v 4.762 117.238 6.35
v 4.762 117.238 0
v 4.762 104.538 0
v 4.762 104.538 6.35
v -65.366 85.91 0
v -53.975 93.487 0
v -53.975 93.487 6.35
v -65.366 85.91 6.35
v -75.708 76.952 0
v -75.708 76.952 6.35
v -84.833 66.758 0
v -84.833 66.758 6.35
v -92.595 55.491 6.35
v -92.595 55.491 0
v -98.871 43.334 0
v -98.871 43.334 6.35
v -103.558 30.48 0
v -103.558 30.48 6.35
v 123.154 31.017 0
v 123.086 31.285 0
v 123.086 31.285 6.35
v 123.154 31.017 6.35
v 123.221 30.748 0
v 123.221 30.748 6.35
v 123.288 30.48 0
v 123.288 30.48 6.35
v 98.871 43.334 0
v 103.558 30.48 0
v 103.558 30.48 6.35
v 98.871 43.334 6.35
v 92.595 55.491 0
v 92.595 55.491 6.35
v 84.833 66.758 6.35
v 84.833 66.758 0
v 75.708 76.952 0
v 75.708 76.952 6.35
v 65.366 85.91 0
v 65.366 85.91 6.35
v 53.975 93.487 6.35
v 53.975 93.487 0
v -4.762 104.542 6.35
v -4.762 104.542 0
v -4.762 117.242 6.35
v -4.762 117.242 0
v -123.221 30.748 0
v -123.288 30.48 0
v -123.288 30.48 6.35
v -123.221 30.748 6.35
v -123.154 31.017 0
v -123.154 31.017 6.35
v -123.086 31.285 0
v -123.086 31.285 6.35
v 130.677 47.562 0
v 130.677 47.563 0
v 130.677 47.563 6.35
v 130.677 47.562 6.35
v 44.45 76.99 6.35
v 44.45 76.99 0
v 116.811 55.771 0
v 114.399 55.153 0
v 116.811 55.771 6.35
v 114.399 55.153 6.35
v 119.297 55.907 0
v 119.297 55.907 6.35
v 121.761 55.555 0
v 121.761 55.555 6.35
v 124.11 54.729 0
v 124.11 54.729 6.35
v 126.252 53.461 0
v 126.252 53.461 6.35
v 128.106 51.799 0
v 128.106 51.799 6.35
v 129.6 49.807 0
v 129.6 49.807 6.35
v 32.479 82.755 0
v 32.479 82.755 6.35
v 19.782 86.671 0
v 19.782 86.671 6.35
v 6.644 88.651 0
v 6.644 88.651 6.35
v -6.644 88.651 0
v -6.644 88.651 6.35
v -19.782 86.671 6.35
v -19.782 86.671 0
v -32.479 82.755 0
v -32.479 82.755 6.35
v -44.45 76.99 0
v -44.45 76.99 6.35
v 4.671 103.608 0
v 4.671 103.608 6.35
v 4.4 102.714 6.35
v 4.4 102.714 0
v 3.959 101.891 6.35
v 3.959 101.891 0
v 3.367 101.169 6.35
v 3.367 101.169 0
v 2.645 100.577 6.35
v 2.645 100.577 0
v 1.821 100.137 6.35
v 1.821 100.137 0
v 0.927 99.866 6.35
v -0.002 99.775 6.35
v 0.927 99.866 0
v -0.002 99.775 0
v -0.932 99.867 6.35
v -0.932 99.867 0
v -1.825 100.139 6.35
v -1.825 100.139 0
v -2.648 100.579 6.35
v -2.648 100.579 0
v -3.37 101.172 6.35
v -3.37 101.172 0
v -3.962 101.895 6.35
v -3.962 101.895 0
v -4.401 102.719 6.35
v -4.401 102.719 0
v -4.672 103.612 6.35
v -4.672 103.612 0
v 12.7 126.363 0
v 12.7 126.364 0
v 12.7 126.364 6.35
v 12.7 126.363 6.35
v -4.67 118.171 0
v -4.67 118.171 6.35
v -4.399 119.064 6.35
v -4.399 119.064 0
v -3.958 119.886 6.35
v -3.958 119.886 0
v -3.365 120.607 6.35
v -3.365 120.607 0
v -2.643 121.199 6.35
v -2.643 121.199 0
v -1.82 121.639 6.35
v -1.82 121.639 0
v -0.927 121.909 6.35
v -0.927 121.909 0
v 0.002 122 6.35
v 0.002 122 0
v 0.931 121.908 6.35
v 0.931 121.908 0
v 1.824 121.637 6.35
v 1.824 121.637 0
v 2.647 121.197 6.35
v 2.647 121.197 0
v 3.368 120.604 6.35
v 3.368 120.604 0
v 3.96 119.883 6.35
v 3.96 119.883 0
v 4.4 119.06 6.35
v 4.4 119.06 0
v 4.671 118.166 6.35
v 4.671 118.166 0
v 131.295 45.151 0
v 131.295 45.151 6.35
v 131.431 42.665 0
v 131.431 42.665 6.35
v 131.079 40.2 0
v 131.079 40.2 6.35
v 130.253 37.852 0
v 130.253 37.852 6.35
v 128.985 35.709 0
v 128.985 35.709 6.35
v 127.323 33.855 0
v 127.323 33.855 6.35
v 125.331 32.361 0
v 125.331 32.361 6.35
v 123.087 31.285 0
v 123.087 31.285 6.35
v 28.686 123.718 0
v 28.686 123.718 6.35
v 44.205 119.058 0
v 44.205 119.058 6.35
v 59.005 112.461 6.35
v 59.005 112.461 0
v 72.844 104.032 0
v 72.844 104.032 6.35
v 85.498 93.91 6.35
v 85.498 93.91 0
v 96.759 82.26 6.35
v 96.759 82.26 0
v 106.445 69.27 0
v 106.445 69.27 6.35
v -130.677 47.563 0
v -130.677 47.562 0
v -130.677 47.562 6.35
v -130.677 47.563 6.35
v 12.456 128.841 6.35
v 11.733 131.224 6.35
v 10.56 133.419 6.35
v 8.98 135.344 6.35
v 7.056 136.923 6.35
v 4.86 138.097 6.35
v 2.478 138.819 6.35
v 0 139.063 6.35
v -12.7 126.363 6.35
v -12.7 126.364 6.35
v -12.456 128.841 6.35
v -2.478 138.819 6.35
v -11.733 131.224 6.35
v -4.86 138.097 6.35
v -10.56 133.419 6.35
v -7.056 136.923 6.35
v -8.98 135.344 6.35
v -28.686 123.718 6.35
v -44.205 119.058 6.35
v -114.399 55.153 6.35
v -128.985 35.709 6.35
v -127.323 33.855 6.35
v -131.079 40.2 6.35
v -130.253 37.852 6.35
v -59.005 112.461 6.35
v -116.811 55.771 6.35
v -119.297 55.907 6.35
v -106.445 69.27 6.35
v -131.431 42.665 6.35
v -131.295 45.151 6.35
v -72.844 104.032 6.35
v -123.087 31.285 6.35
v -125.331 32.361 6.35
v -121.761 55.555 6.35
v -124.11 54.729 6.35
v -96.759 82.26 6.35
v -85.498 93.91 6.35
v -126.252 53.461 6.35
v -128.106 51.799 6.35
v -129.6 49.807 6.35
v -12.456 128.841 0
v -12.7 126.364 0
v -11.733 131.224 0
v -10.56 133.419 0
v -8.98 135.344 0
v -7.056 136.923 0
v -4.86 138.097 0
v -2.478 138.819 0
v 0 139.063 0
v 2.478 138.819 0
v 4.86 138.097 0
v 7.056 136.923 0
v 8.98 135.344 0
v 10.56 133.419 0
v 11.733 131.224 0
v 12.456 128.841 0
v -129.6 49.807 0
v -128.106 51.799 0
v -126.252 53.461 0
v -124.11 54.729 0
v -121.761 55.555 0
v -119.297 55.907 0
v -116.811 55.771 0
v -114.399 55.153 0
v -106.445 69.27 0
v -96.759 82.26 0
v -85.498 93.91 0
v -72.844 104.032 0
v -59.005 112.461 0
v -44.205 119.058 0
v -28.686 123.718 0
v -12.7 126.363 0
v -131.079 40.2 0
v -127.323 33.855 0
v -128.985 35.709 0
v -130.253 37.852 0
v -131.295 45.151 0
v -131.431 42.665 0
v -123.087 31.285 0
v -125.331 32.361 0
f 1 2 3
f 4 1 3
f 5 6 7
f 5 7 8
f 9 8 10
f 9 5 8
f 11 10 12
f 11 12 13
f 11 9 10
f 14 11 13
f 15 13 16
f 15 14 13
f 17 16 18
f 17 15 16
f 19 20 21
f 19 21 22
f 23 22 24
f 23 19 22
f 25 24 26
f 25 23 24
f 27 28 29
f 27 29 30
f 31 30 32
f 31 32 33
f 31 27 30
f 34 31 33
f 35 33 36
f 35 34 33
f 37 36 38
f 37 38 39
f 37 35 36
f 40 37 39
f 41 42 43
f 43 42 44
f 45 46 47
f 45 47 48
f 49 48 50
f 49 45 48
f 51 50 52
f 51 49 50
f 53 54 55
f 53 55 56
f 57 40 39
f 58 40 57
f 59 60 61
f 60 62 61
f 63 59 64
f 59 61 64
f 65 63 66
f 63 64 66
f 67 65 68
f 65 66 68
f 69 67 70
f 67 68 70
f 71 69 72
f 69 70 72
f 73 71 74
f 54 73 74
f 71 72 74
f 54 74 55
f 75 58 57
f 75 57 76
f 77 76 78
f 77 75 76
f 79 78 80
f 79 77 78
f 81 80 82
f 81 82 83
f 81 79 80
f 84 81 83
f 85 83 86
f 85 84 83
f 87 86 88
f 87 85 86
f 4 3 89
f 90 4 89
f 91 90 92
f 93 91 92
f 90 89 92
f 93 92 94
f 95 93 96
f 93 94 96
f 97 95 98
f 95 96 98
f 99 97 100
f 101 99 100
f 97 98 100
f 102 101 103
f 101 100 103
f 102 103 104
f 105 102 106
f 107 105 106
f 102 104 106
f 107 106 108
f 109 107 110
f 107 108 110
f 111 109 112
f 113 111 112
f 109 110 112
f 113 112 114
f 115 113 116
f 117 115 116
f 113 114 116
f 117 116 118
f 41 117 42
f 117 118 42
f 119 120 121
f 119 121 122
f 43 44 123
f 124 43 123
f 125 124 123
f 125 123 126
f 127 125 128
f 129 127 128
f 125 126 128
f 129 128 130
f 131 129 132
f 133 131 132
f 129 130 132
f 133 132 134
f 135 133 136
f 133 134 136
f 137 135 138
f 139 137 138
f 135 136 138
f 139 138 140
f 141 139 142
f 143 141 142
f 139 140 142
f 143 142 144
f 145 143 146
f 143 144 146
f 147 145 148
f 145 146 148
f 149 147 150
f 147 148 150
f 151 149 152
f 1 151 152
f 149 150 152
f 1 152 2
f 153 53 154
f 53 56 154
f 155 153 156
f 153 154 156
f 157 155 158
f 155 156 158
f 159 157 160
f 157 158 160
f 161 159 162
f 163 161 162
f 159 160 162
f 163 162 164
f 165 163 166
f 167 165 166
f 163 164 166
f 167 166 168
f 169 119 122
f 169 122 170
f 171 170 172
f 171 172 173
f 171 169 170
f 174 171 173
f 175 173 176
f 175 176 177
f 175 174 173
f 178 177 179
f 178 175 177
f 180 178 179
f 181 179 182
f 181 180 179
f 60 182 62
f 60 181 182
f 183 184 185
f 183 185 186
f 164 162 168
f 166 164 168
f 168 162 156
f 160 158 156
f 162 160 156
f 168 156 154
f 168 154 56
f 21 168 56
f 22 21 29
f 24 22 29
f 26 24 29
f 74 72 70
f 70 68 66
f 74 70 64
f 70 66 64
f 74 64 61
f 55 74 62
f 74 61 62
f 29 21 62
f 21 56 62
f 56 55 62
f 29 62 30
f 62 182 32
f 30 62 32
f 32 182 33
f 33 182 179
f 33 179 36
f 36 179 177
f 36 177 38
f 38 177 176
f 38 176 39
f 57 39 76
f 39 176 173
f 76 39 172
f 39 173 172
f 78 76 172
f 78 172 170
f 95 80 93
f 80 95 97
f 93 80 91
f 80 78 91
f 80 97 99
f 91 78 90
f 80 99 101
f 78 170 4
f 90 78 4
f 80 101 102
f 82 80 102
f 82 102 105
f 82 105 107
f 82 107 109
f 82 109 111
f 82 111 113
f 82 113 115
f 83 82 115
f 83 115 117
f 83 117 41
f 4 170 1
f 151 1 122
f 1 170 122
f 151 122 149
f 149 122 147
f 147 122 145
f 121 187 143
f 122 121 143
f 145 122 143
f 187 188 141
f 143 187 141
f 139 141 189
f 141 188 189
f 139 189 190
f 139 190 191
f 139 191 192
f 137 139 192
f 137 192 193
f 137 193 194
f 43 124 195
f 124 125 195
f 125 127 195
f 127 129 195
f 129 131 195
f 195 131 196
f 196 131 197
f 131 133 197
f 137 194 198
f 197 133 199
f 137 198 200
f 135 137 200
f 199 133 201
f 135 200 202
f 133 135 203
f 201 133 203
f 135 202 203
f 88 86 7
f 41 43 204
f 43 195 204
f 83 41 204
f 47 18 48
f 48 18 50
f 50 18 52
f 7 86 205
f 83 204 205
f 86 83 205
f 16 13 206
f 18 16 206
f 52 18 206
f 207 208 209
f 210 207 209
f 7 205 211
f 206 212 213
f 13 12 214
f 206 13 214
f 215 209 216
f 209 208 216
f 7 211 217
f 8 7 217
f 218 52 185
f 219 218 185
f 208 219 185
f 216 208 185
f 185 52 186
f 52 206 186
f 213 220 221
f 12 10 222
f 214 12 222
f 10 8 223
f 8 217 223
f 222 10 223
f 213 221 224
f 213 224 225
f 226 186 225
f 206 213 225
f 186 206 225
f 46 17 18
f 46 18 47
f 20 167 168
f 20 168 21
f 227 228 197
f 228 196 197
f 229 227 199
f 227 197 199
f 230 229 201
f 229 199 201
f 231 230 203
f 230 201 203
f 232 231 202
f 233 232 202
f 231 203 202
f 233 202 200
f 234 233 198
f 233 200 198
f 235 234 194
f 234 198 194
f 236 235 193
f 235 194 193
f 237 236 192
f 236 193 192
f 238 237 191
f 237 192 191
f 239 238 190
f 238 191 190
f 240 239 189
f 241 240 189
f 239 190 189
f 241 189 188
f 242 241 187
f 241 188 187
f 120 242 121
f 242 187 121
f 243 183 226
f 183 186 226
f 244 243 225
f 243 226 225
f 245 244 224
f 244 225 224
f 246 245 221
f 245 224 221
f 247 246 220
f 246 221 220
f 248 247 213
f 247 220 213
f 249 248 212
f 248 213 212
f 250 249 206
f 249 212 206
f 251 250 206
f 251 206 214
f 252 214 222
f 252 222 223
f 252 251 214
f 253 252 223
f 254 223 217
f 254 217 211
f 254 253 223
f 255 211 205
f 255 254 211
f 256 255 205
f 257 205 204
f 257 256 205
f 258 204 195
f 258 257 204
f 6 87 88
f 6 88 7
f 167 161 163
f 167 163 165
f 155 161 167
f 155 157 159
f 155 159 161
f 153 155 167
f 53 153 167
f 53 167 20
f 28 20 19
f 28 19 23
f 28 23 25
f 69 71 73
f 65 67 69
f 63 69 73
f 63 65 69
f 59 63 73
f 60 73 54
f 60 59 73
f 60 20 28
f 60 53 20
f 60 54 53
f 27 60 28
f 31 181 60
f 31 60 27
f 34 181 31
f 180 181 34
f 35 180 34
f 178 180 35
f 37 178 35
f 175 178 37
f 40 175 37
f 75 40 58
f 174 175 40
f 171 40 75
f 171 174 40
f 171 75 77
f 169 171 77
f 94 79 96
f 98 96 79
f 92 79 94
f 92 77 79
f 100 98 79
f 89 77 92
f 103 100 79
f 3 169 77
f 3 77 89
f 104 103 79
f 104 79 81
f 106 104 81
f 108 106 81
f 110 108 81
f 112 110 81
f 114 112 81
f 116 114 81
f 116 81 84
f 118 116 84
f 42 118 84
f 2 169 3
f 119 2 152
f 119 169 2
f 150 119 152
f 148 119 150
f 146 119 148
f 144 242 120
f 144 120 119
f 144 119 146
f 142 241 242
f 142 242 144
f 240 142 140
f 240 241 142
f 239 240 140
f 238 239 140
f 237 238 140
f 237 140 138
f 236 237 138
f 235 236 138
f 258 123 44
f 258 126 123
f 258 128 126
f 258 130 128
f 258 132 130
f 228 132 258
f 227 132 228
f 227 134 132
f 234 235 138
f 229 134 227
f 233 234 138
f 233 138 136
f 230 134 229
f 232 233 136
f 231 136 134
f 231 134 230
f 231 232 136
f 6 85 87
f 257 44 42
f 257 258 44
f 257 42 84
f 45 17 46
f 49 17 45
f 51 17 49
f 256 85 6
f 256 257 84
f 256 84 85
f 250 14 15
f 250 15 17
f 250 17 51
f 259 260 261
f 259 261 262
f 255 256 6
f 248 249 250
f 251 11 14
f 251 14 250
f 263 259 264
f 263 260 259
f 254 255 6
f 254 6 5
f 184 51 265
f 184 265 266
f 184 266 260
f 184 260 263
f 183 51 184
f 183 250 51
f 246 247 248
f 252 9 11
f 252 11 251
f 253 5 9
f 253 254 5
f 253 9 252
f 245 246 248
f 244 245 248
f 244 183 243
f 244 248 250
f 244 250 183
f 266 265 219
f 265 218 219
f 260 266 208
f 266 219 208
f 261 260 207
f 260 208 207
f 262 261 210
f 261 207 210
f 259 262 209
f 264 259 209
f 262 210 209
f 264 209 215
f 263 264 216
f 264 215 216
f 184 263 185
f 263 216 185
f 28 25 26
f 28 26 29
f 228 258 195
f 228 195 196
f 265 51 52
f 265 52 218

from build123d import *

# Parameters (mm, degrees)
BOSS_EXTRUDE1_DEPTH     = 6.35
FILLET1_R               = 12.7
CUT_EXTRUDE1_DEPTH      = 192.457982885
CUT_EXTRUDE1_DEPTH_BACK = 192.457982885


with BuildPart() as part:
    # Sketch1 → Boss-Extrude1 (new body)
    with BuildSketch(Plane.XY):
        with BuildLine():
            Line((-12.7, 126.363404513), (-12.7, 139.063404513))
            Line((-12.7, 139.063404513), (12.7, 139.063404513))
            Line((12.7, 139.063404513), (12.7, 126.363404513))
            ThreePointArc((12.7, 126.363404513), (72.844207417, 104.032309625), (114.399102938, 55.152926006))
            Line((114.399102938, 55.152926006), (126.333199222, 59.496581827))
            Line((126.333199222, 59.496581827), (135.020510862, 35.628389259))
            Line((135.020510862, 35.628389259), (123.086414578, 31.284733439))
            ThreePointArc((123.086414578, 31.284733439), (123.187942798, 30.882531456), (123.288156771, 30.48))
            Line((123.288156771, 30.48), (103.55757867, 30.48))
            ThreePointArc((103.55757867, 30.48), (84.832852027, 66.757694065), (53.975, 93.487442339))
            Line((53.975, 93.487442339), (44.45, 76.989658396))
            ThreePointArc((44.45, 76.989658396), (0, 88.9), (-44.45, 76.989658396))
            Line((-44.45, 76.989658396), (-53.975, 93.487442339))
            ThreePointArc((-53.975, 93.487442339), (-84.832852027, 66.757694065), (-103.55757867, 30.48))
            Line((-103.55757867, 30.48), (-123.288156771, 30.48))
            ThreePointArc((-123.288156771, 30.48), (-123.187942798, 30.882531456), (-123.086414578, 31.284733439))
            Line((-123.086414578, 31.284733439), (-135.020510862, 35.628389259))
            Line((-135.020510862, 35.628389259), (-126.333199222, 59.496581827))
            Line((-126.333199222, 59.496581827), (-114.399102938, 55.152926006))
            ThreePointArc((-114.399102938, 55.152926006), (-72.844207417, 104.032309625), (-12.7, 126.363404513))
        make_face()
    extrude(amount=BOSS_EXTRUDE1_DEPTH)

    # Fillet1
    fillet1_edges = [part.edges().sort_by_distance(p)[0] for p in [
        (135.020510862, 35.628389259, 3.175),
        (126.333199222, 59.496581827, 3.175),
        (-135.020510862, 35.628389259, 3.175),
        (-126.333199222, 59.496581827, 3.175),
        (-12.7, 139.063404513, 3.175),
        (12.7, 139.063404513, 3.175),
    ]]
    fillet(fillet1_edges, radius=FILLET1_R - 0.0001)  # a hair under: the kernel refuses the full size

    # Sketch2 → Cut-Extrude1 (cut, two sides: drawn at the far end of the back side and taken through both)
    with BuildSketch(Plane.XY.offset(6.35).offset(-CUT_EXTRUDE1_DEPTH_BACK)):
        with BuildLine():
            Line((-4.762498, 104.541870481), (-4.762498, 117.241865148))
            ThreePointArc((-4.762498, 117.241865148), (0.002182277, 122.000000094), (4.7625, 117.237500594))
            Line((4.7625, 117.237500594), (4.7625, 104.537500594))
            ThreePointArc((4.7625, 104.537500594), (-0.002184944, 99.77500109), (-4.762498, 104.541870481))
        make_face()
    extrude(amount=CUT_EXTRUDE1_DEPTH + CUT_EXTRUDE1_DEPTH_BACK, mode=Mode.SUBTRACT)


solid = part.part
